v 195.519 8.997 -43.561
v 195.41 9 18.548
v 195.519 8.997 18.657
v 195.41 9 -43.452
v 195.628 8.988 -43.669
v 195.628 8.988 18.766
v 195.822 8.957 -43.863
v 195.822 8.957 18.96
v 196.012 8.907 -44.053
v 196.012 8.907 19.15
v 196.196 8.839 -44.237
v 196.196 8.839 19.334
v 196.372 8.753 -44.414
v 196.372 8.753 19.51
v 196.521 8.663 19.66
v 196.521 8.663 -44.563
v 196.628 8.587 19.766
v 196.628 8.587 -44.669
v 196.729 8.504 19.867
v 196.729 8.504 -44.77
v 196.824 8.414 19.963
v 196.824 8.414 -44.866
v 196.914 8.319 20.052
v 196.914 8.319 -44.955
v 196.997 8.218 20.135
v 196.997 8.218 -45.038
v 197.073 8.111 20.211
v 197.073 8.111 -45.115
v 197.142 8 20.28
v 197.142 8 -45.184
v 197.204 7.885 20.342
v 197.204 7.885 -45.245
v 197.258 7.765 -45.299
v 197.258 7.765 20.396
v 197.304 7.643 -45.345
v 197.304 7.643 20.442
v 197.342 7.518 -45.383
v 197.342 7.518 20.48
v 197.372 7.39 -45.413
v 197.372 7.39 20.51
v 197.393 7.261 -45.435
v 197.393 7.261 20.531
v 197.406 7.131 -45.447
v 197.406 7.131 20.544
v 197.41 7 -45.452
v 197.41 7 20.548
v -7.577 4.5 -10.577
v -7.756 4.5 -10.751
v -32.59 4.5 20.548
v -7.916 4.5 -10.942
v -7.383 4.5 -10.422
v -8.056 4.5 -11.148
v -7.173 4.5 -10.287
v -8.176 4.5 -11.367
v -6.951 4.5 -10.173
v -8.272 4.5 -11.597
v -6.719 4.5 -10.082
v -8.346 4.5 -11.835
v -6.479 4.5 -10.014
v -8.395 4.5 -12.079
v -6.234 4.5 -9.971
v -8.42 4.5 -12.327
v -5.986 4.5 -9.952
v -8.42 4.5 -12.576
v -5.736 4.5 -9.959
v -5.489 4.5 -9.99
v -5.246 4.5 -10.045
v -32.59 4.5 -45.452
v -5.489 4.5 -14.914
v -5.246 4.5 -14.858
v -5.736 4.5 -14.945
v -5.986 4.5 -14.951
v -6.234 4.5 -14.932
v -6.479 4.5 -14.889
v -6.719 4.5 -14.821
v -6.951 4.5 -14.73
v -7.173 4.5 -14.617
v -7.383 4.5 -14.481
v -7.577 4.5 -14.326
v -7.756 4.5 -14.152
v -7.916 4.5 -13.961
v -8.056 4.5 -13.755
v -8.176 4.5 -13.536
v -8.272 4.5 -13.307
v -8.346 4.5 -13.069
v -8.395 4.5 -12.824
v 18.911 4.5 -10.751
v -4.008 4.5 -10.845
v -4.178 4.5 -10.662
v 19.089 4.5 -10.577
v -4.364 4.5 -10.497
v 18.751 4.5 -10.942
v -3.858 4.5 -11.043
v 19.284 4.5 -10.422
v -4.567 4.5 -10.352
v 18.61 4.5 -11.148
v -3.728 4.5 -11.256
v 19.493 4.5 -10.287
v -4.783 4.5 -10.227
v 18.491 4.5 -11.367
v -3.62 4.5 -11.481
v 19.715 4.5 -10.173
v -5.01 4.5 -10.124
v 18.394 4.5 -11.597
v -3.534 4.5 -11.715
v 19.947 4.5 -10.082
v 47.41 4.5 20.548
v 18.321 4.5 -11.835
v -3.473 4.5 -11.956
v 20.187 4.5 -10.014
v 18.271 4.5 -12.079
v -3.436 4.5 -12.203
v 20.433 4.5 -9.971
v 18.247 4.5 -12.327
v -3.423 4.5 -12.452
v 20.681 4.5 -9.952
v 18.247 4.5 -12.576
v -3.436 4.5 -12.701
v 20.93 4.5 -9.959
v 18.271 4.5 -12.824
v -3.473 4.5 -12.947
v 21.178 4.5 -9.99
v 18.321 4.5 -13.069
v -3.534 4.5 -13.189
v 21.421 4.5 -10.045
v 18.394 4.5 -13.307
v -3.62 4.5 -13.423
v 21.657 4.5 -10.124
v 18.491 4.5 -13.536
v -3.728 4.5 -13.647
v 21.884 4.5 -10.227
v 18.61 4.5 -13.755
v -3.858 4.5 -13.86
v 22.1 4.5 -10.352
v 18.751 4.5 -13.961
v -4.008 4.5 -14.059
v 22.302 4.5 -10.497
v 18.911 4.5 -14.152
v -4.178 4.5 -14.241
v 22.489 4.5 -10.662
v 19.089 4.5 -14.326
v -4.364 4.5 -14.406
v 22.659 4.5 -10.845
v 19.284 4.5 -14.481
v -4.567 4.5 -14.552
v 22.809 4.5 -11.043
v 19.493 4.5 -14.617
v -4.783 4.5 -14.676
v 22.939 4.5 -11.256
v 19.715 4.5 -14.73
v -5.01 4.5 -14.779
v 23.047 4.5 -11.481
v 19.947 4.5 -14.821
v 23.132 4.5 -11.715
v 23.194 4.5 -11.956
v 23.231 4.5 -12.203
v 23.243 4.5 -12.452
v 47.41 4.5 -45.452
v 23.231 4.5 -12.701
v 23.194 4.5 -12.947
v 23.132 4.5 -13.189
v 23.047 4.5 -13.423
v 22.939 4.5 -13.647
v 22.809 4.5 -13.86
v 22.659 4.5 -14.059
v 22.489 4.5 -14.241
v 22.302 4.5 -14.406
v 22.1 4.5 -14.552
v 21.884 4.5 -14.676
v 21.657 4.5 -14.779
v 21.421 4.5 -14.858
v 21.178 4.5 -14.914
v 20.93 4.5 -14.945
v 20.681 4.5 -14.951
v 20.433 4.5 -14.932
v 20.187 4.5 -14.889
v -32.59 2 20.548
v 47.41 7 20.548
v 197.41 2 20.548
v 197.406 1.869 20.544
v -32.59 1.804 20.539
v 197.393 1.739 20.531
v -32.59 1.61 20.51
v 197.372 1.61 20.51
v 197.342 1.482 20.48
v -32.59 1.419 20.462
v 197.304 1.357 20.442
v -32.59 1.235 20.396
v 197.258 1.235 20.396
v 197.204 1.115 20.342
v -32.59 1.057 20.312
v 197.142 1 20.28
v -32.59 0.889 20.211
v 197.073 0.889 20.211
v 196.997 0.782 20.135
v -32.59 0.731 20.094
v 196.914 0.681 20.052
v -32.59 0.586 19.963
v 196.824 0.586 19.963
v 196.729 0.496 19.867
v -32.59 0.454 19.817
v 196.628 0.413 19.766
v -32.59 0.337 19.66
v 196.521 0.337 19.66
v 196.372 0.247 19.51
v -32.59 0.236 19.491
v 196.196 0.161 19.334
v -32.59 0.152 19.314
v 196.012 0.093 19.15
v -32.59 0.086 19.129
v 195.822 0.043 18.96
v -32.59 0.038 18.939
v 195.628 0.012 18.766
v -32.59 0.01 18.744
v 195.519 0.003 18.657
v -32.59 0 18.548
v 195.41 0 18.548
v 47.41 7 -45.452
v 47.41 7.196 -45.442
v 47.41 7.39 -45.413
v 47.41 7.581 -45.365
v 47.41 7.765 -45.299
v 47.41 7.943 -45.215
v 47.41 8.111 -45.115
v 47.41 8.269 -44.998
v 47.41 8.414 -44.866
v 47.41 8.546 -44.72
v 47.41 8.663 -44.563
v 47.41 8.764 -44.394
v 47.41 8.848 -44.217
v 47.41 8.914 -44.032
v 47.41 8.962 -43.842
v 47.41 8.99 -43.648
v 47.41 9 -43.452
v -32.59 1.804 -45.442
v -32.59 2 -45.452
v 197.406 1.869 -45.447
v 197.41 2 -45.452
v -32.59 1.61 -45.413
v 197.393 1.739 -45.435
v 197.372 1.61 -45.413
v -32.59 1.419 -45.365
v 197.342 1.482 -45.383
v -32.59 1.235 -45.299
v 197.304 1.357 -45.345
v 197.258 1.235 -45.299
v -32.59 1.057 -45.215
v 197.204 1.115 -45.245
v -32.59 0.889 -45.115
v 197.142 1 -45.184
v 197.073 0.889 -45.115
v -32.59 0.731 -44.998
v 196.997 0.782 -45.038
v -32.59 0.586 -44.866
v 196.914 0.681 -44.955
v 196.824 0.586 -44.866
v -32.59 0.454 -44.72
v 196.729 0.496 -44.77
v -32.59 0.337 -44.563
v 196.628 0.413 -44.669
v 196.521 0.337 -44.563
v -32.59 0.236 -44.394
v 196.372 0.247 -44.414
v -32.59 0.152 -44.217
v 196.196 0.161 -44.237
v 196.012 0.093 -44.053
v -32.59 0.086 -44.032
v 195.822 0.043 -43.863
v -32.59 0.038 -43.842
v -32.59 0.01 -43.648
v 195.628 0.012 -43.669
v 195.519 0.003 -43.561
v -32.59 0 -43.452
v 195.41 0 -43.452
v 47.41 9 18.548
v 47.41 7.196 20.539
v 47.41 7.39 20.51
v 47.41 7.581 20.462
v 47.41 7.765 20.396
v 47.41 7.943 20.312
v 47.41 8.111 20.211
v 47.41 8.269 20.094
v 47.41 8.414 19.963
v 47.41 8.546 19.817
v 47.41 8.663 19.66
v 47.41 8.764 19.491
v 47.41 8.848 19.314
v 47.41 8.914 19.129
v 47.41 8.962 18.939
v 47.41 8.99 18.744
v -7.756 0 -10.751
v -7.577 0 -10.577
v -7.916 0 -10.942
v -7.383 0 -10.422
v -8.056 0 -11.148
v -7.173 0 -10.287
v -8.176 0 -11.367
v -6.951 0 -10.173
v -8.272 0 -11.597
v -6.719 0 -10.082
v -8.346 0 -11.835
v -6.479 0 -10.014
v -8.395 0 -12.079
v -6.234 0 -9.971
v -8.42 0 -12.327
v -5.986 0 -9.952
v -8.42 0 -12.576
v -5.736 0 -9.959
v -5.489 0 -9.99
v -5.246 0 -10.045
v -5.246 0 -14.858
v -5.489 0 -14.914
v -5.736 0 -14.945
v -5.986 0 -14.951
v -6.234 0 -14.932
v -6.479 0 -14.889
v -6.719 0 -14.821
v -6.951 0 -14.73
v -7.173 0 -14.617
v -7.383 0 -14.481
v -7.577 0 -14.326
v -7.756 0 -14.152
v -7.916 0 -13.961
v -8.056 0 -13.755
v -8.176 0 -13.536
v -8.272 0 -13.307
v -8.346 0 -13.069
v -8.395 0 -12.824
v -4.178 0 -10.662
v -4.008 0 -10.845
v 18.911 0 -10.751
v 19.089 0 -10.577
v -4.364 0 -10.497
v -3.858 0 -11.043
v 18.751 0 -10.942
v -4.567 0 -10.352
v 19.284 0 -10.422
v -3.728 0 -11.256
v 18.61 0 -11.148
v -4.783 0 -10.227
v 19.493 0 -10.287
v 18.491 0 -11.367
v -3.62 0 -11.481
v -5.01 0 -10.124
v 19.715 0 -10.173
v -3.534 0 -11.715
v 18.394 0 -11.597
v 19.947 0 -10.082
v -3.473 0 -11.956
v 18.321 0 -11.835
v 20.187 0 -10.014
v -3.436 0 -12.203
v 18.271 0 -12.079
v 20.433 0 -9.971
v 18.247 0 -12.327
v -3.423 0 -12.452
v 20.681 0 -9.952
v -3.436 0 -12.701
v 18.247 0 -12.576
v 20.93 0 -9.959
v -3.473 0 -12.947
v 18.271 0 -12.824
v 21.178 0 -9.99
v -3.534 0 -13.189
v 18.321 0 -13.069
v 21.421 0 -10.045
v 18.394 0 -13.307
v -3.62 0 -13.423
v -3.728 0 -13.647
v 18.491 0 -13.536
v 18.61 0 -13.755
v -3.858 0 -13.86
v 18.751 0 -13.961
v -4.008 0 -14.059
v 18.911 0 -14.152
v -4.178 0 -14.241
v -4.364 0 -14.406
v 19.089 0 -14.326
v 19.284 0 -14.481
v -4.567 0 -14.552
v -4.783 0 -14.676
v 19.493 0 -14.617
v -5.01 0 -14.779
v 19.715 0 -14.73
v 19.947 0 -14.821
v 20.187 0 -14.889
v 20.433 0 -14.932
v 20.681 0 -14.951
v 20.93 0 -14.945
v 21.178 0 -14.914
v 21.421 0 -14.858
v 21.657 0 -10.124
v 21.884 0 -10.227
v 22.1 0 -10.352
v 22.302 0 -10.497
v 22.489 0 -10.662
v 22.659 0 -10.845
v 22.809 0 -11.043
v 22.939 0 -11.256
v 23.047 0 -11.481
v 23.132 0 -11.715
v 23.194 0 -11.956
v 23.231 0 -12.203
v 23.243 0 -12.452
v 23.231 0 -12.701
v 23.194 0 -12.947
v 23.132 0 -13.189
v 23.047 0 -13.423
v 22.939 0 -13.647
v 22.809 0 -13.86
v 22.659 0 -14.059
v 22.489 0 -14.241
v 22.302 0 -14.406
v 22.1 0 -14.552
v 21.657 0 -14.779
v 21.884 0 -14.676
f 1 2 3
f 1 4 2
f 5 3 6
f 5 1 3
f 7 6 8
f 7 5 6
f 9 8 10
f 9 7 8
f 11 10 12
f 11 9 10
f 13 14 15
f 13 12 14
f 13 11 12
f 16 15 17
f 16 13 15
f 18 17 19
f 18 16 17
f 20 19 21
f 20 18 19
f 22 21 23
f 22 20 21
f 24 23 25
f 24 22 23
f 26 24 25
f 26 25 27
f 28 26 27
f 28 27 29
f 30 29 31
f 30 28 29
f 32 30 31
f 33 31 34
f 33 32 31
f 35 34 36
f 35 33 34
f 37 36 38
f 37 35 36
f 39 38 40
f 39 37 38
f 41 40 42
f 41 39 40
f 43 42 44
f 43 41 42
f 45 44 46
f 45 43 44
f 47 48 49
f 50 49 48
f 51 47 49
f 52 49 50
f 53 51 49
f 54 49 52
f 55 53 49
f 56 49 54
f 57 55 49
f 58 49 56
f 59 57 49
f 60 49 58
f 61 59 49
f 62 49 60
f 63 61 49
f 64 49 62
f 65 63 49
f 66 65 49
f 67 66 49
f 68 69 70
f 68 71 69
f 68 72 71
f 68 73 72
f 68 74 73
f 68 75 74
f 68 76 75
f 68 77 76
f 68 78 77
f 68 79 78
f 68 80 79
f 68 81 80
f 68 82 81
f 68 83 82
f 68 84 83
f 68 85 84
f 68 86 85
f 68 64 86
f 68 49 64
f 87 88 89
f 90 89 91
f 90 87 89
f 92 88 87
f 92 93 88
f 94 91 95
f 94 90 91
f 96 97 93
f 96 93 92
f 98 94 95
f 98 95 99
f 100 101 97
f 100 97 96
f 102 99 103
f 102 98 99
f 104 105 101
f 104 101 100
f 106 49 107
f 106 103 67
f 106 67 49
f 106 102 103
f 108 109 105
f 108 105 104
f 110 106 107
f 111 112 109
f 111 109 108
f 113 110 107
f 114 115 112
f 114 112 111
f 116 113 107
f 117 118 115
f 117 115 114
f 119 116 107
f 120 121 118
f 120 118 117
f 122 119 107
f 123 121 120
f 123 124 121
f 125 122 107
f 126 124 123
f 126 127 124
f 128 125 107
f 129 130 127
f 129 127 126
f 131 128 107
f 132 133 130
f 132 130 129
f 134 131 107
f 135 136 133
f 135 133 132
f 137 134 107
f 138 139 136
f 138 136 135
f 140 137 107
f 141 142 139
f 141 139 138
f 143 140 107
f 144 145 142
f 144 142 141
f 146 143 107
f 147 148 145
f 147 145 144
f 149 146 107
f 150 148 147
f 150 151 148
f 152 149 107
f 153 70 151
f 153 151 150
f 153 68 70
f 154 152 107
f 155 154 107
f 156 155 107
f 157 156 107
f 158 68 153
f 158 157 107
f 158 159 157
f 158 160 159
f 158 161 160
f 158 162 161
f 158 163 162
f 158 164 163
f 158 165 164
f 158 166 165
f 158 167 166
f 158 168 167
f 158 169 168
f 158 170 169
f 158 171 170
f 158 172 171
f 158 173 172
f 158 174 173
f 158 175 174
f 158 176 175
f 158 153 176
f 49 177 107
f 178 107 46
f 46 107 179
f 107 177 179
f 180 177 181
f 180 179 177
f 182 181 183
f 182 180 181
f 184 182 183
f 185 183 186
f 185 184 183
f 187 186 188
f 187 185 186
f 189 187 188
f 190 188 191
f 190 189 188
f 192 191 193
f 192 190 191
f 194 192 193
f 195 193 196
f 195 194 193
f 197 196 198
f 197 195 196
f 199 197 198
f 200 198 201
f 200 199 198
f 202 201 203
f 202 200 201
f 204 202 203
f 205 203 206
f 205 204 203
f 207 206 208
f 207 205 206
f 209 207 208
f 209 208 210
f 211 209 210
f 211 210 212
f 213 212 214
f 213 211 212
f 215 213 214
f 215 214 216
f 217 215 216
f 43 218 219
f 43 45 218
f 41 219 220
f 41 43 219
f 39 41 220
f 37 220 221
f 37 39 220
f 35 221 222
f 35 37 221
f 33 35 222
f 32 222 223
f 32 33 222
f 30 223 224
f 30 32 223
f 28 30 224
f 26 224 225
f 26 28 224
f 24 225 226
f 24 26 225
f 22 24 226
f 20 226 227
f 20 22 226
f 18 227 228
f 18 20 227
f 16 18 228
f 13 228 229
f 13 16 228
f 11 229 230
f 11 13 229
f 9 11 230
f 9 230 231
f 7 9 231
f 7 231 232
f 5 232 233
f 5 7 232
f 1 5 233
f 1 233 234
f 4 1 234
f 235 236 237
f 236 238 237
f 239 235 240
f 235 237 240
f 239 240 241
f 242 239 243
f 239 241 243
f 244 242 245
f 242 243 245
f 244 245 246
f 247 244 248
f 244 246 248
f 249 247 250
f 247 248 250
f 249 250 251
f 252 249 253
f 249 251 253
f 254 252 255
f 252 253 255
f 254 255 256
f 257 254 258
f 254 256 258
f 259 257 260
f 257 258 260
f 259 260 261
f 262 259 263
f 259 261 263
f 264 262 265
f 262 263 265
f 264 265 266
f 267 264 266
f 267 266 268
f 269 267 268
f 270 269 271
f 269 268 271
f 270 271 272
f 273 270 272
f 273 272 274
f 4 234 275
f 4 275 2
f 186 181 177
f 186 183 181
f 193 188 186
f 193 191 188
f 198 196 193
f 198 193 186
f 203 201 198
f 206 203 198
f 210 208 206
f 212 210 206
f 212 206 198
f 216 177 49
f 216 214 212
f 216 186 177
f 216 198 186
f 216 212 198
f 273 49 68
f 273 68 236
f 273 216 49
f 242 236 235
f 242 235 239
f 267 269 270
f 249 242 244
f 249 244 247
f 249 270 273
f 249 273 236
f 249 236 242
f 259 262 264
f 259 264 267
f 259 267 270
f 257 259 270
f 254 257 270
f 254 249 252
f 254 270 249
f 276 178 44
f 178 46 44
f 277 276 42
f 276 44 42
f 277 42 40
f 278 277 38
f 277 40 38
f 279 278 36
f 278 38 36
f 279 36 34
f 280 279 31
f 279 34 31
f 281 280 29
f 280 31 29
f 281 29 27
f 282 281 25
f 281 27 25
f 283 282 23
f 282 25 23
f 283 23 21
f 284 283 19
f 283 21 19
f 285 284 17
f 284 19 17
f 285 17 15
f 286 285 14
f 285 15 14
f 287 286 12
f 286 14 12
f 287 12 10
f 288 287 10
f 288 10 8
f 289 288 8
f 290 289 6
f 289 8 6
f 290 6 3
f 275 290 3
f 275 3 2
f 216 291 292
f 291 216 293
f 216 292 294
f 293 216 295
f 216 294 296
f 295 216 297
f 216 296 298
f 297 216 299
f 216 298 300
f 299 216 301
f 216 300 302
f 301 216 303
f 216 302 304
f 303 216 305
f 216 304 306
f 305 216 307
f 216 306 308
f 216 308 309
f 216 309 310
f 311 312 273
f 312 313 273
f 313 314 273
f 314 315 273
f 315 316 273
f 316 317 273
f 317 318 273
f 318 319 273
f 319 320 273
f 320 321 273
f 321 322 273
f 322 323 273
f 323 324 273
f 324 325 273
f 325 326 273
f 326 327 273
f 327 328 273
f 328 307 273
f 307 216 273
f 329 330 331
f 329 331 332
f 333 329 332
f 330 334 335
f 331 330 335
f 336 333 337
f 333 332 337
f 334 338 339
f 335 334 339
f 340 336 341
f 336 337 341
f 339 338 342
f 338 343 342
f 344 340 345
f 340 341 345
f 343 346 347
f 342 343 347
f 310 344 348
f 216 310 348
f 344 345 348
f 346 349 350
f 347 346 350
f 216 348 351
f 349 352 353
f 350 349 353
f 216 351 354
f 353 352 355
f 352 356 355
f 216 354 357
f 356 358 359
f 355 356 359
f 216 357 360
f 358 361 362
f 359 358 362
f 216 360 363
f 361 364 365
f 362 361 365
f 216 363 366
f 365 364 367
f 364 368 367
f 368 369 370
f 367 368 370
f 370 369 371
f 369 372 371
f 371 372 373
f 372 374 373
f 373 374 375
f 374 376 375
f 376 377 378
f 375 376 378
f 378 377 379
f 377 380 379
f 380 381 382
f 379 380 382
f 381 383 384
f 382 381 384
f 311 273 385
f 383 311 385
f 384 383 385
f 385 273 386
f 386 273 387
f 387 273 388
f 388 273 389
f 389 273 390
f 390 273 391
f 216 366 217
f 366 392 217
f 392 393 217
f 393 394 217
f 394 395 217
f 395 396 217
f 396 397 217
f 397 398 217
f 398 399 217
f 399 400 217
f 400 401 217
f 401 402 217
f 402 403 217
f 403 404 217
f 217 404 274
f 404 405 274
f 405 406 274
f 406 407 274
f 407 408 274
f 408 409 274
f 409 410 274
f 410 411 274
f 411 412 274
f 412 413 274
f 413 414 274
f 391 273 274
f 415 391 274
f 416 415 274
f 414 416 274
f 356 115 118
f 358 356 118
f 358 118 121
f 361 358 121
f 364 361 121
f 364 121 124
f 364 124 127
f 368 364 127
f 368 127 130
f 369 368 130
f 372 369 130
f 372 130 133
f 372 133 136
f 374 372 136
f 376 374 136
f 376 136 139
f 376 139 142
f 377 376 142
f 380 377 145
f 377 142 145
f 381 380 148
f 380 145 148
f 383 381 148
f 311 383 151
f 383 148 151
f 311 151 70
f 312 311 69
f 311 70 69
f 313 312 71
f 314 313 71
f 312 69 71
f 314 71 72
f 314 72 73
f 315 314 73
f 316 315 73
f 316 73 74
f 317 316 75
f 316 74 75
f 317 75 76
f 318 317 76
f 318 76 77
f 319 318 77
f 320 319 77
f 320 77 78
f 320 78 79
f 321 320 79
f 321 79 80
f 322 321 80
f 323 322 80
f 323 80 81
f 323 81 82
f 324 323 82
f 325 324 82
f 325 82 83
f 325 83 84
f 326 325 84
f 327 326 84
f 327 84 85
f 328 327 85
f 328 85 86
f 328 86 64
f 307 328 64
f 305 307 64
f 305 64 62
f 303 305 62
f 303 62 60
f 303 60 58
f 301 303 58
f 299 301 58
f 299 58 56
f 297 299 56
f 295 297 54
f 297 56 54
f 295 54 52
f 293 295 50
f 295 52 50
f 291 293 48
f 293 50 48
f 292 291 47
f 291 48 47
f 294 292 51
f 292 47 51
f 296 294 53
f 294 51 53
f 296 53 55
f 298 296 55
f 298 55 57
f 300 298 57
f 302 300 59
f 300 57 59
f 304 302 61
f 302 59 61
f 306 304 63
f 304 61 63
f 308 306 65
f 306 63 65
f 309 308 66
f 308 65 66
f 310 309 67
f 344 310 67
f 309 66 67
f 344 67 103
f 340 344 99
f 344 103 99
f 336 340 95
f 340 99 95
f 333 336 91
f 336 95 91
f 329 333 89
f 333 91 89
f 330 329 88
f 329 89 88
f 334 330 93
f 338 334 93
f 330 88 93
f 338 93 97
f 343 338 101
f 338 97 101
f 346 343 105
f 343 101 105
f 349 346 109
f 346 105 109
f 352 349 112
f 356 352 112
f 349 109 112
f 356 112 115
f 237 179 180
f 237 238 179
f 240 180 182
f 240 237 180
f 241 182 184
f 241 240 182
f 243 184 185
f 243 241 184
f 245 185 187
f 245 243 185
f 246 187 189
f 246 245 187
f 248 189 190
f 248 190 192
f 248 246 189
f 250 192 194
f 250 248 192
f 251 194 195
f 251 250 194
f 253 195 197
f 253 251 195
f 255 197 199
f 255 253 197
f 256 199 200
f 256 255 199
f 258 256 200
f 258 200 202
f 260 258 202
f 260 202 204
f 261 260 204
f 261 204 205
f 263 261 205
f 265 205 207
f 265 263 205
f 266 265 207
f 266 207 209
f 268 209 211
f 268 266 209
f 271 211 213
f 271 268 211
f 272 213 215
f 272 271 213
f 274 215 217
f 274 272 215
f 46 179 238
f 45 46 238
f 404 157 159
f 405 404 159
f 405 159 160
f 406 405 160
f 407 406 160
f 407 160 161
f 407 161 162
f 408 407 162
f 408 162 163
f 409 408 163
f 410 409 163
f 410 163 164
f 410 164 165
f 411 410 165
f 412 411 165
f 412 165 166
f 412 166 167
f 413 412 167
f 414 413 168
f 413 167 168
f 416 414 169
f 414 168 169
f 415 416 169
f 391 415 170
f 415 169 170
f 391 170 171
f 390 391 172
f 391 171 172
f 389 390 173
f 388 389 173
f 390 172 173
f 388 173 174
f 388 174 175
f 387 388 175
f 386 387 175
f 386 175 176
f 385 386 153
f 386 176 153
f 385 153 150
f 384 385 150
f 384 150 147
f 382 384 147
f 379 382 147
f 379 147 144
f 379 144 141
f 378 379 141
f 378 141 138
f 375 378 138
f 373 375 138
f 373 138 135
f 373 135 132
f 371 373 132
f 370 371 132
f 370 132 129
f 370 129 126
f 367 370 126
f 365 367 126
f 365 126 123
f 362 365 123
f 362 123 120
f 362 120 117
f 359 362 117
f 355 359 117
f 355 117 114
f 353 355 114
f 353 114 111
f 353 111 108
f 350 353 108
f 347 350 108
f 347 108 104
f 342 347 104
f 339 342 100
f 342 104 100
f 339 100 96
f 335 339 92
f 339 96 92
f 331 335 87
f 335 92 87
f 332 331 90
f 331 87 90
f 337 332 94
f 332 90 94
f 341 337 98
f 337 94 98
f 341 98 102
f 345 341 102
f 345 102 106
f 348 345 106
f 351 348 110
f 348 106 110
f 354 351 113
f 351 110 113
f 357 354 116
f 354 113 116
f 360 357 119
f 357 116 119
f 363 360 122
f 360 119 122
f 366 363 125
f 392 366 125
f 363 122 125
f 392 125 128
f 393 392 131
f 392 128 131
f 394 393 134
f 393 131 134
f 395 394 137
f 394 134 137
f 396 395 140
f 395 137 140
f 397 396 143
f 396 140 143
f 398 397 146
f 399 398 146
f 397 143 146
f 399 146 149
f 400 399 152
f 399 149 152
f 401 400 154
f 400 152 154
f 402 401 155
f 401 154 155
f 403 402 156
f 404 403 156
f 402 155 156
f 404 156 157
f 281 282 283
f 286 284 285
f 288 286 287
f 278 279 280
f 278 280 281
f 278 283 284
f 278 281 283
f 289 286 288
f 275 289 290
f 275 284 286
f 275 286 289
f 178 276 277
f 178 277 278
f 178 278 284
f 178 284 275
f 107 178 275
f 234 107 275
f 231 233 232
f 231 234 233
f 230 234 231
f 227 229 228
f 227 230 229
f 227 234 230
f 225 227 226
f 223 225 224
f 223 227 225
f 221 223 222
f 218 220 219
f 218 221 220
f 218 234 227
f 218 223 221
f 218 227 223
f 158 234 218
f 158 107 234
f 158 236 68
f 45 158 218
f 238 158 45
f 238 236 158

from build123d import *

# Parameters (mm, degrees)
SKETCH1_W             = 230
SKETCH1_H             = 66
BOSS_EXTRUDE1_DEPTH   = 4.5
SKETCH11_W            = 150
SKETCH11_H            = 66
BOSS_EXTRUDE2_DEPTH   = 4.5
F_5_0MM_DOWEL_HOLE1_D = 5
FILLET1_R             = 2


with BuildPart() as part:
    # Sketch1 → Boss-Extrude1 (new body)
    with BuildSketch(Plane(origin=(0, 0, 0), x_dir=(1, 0, 0), z_dir=(0, 1, 0))):
        with Locations((82.410138249, 12.451612903)):
            Rectangle(SKETCH1_W, SKETCH1_H)
    extrude(amount=BOSS_EXTRUDE1_DEPTH)

    # Sketch11 → Boss-Extrude2 (add)
    with BuildSketch(Plane(origin=(0, 4.5, 0), x_dir=(1, 0, 0), z_dir=(0, 1, 0))):
        with Locations((122.410138249, 12.451612903)):
            Rectangle(SKETCH11_W, SKETCH11_H)
    extrude(amount=BOSS_EXTRUDE2_DEPTH)

    # Ø5.0mm Dowel Hole1 (through all)
    with Locations(Plane(origin=(0, 0, 0), x_dir=(-1, 0, 0), z_dir=(0, -1, 0))):
        with Locations((5.923195084, 12.451612903), (-20.743471582, 12.451612903)):
            Hole(F_5_0MM_DOWEL_HOLE1_D / 2)

    # Fillet1
    fillet1_edges = [part.edges().sort_by_distance(p)[0] for p in [
        (122.410138249, 9, -45.451612903),
        (122.410138249, 9, 20.548387097),
        (197.410138249, 9, -12.451612903),
        (82.410138249, 0, -45.451612903),
        (197.410138249, 0, -12.451612903),
        (82.410138249, 0, 20.548387097),
    ]]
    fillet(fillet1_edges, radius=FILLET1_R)


solid = part.part
